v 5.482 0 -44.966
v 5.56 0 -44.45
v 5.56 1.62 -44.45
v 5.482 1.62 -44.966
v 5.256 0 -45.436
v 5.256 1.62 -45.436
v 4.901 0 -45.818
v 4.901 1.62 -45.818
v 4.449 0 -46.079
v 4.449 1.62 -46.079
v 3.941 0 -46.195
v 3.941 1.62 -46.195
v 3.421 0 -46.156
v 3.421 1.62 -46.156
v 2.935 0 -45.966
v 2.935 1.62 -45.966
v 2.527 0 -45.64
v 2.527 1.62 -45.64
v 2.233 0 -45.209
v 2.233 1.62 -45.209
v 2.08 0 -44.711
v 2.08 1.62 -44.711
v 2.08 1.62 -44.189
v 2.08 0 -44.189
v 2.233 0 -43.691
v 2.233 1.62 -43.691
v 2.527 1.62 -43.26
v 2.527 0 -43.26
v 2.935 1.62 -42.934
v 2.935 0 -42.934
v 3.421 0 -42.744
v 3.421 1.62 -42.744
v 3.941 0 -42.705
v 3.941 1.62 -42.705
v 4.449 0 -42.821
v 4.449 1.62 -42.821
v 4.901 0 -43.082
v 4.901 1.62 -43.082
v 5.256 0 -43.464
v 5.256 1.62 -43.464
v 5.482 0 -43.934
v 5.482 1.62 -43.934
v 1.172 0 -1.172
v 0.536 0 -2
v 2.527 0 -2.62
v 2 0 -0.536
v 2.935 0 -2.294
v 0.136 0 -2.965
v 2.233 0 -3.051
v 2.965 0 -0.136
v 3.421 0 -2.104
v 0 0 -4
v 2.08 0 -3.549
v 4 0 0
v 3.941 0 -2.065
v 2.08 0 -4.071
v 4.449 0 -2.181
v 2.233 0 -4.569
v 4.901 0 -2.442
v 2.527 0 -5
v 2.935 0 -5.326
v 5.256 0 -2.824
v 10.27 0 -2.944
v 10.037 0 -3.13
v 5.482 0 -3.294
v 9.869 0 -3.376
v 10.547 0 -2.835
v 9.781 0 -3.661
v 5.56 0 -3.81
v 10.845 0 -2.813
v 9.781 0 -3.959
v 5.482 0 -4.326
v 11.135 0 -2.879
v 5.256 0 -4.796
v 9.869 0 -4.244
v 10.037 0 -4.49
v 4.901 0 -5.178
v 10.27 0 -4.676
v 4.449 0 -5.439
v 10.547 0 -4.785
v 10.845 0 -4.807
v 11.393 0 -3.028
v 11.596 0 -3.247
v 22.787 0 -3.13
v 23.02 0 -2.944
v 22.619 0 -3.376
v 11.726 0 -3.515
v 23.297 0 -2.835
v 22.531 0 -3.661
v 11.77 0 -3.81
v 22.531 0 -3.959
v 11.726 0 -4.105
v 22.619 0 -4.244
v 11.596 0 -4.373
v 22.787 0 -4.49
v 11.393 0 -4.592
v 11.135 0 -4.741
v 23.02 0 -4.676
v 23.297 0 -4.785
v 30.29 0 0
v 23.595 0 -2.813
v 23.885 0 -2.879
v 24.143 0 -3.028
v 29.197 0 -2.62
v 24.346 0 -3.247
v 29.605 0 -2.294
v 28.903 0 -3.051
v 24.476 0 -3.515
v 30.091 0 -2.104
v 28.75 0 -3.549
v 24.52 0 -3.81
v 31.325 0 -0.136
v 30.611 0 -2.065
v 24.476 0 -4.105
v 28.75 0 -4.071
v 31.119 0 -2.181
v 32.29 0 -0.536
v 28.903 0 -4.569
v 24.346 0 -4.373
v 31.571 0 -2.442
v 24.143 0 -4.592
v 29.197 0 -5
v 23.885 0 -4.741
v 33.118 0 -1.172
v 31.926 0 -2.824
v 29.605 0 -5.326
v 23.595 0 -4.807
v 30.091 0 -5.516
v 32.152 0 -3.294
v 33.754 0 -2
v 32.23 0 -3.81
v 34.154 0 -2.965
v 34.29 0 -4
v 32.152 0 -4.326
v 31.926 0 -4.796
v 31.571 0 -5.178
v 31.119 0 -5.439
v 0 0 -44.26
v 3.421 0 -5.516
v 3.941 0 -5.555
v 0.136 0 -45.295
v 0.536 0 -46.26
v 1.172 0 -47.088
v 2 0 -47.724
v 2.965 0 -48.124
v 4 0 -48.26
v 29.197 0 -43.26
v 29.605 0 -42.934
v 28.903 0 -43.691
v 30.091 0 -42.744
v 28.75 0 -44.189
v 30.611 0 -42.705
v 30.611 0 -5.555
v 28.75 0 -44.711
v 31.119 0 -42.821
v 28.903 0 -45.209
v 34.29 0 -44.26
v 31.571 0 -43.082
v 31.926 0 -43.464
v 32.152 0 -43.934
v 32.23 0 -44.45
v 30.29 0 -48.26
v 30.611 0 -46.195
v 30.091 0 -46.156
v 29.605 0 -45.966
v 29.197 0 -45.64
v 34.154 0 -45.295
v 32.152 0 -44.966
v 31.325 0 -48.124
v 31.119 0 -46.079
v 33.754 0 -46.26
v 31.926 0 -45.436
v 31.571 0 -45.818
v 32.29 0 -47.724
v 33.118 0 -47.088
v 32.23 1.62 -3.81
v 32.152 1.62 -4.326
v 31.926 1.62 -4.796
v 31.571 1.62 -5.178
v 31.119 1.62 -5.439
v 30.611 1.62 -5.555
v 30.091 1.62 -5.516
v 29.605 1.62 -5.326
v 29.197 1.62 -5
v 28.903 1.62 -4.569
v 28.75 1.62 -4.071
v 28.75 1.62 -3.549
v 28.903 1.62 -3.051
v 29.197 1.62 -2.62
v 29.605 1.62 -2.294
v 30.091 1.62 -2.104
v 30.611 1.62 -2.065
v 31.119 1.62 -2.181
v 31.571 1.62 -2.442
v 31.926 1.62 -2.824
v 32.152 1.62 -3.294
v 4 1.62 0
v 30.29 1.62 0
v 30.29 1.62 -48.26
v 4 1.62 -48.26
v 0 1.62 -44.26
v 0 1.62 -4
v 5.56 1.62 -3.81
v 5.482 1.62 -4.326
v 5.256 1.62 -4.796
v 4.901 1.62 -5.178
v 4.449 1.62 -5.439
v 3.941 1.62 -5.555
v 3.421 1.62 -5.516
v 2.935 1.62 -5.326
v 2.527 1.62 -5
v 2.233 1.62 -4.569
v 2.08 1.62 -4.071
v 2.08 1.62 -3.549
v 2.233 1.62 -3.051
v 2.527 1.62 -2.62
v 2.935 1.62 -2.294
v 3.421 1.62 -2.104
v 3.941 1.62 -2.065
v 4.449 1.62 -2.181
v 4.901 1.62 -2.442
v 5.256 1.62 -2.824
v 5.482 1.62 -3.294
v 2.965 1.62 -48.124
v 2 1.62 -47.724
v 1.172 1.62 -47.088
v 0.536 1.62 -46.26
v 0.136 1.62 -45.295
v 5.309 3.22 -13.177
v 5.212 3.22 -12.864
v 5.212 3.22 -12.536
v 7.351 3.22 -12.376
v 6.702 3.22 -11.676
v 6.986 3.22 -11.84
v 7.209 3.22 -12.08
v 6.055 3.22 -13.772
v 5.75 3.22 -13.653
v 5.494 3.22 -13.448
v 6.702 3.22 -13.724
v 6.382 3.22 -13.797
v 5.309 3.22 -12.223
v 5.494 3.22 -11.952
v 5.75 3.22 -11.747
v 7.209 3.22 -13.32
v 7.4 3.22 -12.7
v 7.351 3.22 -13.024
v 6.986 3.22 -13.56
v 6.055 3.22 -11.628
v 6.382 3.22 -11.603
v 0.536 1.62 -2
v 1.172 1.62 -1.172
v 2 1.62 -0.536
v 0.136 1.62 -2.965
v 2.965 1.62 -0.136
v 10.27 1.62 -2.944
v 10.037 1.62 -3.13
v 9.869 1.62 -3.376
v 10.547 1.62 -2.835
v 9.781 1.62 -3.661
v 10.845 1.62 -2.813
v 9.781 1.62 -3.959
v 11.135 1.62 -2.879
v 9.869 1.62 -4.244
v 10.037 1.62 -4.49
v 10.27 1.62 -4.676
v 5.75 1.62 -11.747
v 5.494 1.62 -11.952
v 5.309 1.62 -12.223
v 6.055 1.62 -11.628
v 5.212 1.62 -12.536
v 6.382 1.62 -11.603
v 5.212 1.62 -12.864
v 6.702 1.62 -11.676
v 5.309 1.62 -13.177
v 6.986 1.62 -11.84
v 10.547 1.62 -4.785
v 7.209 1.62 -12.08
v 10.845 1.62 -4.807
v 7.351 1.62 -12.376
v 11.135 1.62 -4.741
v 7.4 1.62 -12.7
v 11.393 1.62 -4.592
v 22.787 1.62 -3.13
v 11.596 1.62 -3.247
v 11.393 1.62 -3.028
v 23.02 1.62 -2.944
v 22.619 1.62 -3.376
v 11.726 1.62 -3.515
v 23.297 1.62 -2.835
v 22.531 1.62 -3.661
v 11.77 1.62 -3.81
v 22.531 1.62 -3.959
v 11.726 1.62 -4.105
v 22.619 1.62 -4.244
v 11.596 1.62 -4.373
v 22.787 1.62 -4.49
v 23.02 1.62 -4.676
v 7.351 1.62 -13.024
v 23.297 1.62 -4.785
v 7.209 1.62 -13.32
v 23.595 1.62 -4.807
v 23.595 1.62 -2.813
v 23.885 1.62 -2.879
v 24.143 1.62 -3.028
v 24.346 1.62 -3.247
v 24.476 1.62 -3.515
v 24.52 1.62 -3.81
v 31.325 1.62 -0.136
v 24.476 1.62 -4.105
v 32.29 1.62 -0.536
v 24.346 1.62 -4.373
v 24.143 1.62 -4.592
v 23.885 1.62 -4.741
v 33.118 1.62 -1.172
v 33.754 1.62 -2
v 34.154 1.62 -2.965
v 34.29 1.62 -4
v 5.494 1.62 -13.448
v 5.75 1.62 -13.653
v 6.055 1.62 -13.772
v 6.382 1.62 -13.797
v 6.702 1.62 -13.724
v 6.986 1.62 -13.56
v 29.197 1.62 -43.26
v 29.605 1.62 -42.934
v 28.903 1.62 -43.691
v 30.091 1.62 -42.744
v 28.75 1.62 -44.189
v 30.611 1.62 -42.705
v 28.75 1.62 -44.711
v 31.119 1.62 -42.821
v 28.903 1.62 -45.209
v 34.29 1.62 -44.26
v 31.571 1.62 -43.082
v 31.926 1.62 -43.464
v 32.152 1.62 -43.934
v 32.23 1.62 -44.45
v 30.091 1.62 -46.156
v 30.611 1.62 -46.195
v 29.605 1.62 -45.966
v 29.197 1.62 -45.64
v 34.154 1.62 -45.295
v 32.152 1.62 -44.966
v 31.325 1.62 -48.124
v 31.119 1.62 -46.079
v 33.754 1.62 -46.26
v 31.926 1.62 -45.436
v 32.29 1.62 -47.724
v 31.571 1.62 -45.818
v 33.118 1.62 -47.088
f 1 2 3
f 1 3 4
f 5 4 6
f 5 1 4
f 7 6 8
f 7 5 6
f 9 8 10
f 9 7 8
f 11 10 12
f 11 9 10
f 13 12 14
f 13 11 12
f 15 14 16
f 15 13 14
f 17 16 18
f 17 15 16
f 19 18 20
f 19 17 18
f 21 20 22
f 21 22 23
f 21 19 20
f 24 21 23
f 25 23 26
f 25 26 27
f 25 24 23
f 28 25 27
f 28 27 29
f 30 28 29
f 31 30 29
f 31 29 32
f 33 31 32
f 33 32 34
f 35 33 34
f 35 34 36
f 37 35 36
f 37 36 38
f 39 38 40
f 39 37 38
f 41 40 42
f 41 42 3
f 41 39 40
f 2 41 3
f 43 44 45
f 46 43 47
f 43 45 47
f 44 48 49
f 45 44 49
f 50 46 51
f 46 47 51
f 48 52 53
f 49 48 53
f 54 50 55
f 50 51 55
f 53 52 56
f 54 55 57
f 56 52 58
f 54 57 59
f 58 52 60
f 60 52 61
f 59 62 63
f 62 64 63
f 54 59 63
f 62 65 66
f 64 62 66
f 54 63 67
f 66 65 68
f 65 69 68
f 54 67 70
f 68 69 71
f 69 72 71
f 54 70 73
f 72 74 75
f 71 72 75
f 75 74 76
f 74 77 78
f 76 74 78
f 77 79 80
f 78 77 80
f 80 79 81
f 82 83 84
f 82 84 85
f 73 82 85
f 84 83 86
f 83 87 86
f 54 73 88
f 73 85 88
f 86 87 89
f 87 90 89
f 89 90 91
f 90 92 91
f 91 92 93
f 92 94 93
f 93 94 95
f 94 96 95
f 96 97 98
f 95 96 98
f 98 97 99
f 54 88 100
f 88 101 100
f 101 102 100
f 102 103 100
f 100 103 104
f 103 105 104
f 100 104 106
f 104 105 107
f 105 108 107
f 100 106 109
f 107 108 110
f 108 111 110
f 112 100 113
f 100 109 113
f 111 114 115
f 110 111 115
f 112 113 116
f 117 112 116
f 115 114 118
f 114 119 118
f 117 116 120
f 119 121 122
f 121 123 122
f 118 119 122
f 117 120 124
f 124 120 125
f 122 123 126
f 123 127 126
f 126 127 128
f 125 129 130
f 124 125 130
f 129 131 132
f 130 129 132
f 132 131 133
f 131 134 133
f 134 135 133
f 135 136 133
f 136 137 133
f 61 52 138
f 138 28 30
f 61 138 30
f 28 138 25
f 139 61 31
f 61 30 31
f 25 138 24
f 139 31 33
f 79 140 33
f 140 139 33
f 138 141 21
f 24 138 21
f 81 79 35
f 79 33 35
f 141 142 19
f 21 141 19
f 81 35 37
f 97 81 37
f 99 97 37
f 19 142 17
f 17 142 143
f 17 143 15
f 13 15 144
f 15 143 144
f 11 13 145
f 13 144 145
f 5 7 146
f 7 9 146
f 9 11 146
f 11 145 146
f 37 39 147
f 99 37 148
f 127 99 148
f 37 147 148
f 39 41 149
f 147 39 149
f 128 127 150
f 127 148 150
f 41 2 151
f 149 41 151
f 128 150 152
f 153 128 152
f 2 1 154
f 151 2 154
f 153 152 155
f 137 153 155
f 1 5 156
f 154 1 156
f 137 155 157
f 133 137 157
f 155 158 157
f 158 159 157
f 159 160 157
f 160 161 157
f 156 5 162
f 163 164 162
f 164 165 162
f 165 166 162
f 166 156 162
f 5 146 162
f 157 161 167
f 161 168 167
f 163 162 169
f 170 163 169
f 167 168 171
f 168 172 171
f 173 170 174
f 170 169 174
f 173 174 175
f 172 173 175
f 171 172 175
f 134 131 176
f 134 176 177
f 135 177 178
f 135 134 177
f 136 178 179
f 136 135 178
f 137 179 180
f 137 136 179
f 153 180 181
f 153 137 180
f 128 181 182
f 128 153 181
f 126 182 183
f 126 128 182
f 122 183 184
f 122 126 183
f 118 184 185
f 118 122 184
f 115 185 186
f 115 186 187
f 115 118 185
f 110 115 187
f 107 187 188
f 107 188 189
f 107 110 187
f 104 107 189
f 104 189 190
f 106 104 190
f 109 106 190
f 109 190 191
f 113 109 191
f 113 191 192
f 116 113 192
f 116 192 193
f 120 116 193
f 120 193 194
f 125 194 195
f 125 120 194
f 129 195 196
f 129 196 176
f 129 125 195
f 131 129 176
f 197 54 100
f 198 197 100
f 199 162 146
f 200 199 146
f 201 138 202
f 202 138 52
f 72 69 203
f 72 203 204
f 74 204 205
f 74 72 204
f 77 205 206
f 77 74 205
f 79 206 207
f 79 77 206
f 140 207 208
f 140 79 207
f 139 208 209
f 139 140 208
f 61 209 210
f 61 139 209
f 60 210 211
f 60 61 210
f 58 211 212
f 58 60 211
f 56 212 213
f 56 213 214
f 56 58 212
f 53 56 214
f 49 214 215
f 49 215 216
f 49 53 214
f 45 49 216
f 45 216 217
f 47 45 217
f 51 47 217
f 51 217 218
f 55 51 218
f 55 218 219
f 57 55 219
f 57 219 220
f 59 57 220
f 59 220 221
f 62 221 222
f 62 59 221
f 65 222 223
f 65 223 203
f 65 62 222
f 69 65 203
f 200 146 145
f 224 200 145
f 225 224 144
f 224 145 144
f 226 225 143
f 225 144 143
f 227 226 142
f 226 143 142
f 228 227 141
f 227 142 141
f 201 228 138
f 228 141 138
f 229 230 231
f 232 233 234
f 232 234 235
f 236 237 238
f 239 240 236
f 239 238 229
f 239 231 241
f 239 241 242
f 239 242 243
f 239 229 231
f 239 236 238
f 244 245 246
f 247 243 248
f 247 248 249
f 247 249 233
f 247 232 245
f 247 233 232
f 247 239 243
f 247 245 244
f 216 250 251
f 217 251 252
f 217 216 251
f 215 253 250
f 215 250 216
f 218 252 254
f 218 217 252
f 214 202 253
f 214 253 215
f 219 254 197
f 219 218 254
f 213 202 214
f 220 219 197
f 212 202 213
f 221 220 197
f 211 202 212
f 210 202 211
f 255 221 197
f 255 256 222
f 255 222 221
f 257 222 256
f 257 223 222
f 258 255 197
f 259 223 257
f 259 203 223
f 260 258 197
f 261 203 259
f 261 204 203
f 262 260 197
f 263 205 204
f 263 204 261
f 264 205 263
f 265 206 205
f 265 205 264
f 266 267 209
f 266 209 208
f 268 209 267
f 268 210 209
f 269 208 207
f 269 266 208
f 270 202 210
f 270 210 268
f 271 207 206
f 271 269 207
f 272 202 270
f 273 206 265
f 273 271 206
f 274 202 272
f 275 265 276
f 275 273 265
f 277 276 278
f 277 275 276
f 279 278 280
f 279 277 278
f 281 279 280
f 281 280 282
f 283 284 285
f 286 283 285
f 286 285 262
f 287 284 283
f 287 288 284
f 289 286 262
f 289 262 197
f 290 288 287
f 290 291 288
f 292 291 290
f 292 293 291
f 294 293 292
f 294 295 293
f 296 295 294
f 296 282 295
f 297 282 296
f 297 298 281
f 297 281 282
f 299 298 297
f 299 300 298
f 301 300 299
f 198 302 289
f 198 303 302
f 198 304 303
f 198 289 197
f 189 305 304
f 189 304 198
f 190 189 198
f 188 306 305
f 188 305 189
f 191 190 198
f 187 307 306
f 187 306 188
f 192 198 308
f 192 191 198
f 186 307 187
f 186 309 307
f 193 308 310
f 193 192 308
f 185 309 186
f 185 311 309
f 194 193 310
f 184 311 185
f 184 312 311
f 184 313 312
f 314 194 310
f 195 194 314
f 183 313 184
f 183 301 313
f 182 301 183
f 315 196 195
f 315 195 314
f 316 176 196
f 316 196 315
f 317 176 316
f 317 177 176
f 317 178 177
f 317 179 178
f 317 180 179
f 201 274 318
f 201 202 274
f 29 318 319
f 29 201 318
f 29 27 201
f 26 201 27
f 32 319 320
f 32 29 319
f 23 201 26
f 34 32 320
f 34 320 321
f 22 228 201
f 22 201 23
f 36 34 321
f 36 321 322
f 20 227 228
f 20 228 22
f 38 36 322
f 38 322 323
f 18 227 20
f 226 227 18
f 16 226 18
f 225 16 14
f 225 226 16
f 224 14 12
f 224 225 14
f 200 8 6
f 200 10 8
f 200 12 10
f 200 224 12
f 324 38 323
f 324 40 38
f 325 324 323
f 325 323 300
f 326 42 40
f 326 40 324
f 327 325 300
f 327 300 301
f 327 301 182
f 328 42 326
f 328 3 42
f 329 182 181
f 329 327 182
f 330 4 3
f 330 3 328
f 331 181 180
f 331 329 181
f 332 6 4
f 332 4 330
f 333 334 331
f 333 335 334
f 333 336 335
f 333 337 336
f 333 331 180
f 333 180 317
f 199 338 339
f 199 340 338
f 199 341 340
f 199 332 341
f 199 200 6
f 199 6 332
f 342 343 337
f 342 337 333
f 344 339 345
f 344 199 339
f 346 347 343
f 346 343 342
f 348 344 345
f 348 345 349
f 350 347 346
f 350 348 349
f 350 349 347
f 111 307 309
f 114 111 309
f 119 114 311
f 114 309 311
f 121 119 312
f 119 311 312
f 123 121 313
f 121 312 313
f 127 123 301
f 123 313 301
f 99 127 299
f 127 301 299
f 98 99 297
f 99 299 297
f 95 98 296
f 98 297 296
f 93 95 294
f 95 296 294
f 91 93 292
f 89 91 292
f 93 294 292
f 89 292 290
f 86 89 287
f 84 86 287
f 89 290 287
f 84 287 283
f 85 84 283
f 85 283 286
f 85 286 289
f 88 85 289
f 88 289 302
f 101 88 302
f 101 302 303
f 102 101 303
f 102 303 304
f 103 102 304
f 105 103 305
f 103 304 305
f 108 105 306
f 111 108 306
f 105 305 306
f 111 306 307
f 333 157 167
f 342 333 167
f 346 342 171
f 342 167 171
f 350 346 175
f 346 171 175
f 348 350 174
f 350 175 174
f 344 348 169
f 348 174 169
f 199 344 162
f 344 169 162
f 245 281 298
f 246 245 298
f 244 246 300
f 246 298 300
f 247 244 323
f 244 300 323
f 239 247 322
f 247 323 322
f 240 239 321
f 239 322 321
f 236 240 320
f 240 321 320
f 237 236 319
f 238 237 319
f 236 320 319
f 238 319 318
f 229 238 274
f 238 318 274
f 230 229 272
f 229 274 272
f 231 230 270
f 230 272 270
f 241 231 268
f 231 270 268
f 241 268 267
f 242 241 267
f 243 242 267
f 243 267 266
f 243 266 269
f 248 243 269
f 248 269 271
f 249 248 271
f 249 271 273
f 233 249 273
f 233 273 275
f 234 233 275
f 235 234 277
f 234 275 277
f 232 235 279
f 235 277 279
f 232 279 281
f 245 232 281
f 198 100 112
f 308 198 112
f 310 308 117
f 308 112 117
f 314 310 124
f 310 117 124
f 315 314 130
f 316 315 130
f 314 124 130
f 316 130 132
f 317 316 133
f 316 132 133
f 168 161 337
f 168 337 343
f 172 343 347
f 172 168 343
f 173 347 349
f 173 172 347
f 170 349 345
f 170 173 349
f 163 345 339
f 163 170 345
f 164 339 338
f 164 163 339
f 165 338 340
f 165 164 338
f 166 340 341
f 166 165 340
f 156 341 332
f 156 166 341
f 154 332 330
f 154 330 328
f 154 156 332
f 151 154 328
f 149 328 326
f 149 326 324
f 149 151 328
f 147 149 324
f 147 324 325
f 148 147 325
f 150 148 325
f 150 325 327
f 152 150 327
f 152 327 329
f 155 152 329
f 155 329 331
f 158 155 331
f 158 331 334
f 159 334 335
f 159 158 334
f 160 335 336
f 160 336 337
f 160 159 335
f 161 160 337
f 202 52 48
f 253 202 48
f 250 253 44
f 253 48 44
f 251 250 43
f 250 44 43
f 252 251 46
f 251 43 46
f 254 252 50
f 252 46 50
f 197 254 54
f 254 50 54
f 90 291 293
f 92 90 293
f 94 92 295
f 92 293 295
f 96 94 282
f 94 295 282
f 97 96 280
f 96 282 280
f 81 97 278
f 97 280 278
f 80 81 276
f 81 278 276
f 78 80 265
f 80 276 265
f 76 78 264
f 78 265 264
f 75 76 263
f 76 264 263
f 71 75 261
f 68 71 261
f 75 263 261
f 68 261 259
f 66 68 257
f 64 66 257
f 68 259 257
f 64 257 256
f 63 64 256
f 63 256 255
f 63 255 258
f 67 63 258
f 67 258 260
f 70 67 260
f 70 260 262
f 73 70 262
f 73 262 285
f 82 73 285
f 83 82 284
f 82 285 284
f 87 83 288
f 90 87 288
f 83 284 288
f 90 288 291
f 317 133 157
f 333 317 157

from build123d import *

# Parameters (mm, degrees)
SKETCH1_R           = 1.75
BOSS_EXTRUDE1_DEPTH = 1.62
SKETCH2_R           = 1
CUT_EXTRUDE1_DEPTH  = 1.62
SKETCH3_R           = 1.1
BOSS_EXTRUDE2_DEPTH = 1.6


with BuildPart() as part:
    # Sketch1 → Boss-Extrude1 (new body)
    with BuildSketch(Plane(origin=(0, 0, 0), x_dir=(1, 0, 0), z_dir=(0, 1, 0))):
        with BuildLine():
            Line((30.29, 48.26), (4, 48.26))
            ThreePointArc((4, 48.26), (1.171572875, 47.088427125), (0, 44.26))
            Line((0, 44.26), (0, 4))
            ThreePointArc((0, 4), (1.171572875, 1.171572875), (4, 0))
            Line((4, 0), (30.29, 0))
            ThreePointArc((30.29, 0), (33.118427125, 1.171572875), (34.29, 4))
            Line((34.29, 4), (34.29, 44.26))
            ThreePointArc((34.29, 44.26), (33.118427125, 47.088427125), (30.29, 48.26))
        make_face()
        with Locations((30.48, 44.45)):
            Circle(SKETCH1_R, mode=Mode.SUBTRACT)
        with Locations((3.81, 44.45)):
            Circle(SKETCH1_R, mode=Mode.SUBTRACT)
        with Locations((30.48, 3.81)):
            Circle(SKETCH1_R, mode=Mode.SUBTRACT)
        with Locations((3.81, 3.81)):
            Circle(SKETCH1_R, mode=Mode.SUBTRACT)
    extrude(amount=BOSS_EXTRUDE1_DEPTH)

    # Sketch2 → Cut-Extrude1 (cut)
    with BuildSketch(Plane(origin=(0, 1.62, 0), x_dir=(1, 0, 0), z_dir=(0, 1, 0))):
        with Locations((23.52, 3.81)):
            Circle(SKETCH2_R)
        with Locations((10.77, 3.81)):
            Circle(SKETCH2_R)
    extrude(amount=-CUT_EXTRUDE1_DEPTH, mode=Mode.SUBTRACT)

    # Sketch3 → Boss-Extrude2 (add)
    with BuildSketch(Plane(origin=(0, 1.62, 0), x_dir=(1, 0, 0), z_dir=(0, 1, 0))):
        with Locations((6.3, 12.7)):
            Circle(SKETCH3_R)
    extrude(amount=BOSS_EXTRUDE2_DEPTH)


solid = part.part
